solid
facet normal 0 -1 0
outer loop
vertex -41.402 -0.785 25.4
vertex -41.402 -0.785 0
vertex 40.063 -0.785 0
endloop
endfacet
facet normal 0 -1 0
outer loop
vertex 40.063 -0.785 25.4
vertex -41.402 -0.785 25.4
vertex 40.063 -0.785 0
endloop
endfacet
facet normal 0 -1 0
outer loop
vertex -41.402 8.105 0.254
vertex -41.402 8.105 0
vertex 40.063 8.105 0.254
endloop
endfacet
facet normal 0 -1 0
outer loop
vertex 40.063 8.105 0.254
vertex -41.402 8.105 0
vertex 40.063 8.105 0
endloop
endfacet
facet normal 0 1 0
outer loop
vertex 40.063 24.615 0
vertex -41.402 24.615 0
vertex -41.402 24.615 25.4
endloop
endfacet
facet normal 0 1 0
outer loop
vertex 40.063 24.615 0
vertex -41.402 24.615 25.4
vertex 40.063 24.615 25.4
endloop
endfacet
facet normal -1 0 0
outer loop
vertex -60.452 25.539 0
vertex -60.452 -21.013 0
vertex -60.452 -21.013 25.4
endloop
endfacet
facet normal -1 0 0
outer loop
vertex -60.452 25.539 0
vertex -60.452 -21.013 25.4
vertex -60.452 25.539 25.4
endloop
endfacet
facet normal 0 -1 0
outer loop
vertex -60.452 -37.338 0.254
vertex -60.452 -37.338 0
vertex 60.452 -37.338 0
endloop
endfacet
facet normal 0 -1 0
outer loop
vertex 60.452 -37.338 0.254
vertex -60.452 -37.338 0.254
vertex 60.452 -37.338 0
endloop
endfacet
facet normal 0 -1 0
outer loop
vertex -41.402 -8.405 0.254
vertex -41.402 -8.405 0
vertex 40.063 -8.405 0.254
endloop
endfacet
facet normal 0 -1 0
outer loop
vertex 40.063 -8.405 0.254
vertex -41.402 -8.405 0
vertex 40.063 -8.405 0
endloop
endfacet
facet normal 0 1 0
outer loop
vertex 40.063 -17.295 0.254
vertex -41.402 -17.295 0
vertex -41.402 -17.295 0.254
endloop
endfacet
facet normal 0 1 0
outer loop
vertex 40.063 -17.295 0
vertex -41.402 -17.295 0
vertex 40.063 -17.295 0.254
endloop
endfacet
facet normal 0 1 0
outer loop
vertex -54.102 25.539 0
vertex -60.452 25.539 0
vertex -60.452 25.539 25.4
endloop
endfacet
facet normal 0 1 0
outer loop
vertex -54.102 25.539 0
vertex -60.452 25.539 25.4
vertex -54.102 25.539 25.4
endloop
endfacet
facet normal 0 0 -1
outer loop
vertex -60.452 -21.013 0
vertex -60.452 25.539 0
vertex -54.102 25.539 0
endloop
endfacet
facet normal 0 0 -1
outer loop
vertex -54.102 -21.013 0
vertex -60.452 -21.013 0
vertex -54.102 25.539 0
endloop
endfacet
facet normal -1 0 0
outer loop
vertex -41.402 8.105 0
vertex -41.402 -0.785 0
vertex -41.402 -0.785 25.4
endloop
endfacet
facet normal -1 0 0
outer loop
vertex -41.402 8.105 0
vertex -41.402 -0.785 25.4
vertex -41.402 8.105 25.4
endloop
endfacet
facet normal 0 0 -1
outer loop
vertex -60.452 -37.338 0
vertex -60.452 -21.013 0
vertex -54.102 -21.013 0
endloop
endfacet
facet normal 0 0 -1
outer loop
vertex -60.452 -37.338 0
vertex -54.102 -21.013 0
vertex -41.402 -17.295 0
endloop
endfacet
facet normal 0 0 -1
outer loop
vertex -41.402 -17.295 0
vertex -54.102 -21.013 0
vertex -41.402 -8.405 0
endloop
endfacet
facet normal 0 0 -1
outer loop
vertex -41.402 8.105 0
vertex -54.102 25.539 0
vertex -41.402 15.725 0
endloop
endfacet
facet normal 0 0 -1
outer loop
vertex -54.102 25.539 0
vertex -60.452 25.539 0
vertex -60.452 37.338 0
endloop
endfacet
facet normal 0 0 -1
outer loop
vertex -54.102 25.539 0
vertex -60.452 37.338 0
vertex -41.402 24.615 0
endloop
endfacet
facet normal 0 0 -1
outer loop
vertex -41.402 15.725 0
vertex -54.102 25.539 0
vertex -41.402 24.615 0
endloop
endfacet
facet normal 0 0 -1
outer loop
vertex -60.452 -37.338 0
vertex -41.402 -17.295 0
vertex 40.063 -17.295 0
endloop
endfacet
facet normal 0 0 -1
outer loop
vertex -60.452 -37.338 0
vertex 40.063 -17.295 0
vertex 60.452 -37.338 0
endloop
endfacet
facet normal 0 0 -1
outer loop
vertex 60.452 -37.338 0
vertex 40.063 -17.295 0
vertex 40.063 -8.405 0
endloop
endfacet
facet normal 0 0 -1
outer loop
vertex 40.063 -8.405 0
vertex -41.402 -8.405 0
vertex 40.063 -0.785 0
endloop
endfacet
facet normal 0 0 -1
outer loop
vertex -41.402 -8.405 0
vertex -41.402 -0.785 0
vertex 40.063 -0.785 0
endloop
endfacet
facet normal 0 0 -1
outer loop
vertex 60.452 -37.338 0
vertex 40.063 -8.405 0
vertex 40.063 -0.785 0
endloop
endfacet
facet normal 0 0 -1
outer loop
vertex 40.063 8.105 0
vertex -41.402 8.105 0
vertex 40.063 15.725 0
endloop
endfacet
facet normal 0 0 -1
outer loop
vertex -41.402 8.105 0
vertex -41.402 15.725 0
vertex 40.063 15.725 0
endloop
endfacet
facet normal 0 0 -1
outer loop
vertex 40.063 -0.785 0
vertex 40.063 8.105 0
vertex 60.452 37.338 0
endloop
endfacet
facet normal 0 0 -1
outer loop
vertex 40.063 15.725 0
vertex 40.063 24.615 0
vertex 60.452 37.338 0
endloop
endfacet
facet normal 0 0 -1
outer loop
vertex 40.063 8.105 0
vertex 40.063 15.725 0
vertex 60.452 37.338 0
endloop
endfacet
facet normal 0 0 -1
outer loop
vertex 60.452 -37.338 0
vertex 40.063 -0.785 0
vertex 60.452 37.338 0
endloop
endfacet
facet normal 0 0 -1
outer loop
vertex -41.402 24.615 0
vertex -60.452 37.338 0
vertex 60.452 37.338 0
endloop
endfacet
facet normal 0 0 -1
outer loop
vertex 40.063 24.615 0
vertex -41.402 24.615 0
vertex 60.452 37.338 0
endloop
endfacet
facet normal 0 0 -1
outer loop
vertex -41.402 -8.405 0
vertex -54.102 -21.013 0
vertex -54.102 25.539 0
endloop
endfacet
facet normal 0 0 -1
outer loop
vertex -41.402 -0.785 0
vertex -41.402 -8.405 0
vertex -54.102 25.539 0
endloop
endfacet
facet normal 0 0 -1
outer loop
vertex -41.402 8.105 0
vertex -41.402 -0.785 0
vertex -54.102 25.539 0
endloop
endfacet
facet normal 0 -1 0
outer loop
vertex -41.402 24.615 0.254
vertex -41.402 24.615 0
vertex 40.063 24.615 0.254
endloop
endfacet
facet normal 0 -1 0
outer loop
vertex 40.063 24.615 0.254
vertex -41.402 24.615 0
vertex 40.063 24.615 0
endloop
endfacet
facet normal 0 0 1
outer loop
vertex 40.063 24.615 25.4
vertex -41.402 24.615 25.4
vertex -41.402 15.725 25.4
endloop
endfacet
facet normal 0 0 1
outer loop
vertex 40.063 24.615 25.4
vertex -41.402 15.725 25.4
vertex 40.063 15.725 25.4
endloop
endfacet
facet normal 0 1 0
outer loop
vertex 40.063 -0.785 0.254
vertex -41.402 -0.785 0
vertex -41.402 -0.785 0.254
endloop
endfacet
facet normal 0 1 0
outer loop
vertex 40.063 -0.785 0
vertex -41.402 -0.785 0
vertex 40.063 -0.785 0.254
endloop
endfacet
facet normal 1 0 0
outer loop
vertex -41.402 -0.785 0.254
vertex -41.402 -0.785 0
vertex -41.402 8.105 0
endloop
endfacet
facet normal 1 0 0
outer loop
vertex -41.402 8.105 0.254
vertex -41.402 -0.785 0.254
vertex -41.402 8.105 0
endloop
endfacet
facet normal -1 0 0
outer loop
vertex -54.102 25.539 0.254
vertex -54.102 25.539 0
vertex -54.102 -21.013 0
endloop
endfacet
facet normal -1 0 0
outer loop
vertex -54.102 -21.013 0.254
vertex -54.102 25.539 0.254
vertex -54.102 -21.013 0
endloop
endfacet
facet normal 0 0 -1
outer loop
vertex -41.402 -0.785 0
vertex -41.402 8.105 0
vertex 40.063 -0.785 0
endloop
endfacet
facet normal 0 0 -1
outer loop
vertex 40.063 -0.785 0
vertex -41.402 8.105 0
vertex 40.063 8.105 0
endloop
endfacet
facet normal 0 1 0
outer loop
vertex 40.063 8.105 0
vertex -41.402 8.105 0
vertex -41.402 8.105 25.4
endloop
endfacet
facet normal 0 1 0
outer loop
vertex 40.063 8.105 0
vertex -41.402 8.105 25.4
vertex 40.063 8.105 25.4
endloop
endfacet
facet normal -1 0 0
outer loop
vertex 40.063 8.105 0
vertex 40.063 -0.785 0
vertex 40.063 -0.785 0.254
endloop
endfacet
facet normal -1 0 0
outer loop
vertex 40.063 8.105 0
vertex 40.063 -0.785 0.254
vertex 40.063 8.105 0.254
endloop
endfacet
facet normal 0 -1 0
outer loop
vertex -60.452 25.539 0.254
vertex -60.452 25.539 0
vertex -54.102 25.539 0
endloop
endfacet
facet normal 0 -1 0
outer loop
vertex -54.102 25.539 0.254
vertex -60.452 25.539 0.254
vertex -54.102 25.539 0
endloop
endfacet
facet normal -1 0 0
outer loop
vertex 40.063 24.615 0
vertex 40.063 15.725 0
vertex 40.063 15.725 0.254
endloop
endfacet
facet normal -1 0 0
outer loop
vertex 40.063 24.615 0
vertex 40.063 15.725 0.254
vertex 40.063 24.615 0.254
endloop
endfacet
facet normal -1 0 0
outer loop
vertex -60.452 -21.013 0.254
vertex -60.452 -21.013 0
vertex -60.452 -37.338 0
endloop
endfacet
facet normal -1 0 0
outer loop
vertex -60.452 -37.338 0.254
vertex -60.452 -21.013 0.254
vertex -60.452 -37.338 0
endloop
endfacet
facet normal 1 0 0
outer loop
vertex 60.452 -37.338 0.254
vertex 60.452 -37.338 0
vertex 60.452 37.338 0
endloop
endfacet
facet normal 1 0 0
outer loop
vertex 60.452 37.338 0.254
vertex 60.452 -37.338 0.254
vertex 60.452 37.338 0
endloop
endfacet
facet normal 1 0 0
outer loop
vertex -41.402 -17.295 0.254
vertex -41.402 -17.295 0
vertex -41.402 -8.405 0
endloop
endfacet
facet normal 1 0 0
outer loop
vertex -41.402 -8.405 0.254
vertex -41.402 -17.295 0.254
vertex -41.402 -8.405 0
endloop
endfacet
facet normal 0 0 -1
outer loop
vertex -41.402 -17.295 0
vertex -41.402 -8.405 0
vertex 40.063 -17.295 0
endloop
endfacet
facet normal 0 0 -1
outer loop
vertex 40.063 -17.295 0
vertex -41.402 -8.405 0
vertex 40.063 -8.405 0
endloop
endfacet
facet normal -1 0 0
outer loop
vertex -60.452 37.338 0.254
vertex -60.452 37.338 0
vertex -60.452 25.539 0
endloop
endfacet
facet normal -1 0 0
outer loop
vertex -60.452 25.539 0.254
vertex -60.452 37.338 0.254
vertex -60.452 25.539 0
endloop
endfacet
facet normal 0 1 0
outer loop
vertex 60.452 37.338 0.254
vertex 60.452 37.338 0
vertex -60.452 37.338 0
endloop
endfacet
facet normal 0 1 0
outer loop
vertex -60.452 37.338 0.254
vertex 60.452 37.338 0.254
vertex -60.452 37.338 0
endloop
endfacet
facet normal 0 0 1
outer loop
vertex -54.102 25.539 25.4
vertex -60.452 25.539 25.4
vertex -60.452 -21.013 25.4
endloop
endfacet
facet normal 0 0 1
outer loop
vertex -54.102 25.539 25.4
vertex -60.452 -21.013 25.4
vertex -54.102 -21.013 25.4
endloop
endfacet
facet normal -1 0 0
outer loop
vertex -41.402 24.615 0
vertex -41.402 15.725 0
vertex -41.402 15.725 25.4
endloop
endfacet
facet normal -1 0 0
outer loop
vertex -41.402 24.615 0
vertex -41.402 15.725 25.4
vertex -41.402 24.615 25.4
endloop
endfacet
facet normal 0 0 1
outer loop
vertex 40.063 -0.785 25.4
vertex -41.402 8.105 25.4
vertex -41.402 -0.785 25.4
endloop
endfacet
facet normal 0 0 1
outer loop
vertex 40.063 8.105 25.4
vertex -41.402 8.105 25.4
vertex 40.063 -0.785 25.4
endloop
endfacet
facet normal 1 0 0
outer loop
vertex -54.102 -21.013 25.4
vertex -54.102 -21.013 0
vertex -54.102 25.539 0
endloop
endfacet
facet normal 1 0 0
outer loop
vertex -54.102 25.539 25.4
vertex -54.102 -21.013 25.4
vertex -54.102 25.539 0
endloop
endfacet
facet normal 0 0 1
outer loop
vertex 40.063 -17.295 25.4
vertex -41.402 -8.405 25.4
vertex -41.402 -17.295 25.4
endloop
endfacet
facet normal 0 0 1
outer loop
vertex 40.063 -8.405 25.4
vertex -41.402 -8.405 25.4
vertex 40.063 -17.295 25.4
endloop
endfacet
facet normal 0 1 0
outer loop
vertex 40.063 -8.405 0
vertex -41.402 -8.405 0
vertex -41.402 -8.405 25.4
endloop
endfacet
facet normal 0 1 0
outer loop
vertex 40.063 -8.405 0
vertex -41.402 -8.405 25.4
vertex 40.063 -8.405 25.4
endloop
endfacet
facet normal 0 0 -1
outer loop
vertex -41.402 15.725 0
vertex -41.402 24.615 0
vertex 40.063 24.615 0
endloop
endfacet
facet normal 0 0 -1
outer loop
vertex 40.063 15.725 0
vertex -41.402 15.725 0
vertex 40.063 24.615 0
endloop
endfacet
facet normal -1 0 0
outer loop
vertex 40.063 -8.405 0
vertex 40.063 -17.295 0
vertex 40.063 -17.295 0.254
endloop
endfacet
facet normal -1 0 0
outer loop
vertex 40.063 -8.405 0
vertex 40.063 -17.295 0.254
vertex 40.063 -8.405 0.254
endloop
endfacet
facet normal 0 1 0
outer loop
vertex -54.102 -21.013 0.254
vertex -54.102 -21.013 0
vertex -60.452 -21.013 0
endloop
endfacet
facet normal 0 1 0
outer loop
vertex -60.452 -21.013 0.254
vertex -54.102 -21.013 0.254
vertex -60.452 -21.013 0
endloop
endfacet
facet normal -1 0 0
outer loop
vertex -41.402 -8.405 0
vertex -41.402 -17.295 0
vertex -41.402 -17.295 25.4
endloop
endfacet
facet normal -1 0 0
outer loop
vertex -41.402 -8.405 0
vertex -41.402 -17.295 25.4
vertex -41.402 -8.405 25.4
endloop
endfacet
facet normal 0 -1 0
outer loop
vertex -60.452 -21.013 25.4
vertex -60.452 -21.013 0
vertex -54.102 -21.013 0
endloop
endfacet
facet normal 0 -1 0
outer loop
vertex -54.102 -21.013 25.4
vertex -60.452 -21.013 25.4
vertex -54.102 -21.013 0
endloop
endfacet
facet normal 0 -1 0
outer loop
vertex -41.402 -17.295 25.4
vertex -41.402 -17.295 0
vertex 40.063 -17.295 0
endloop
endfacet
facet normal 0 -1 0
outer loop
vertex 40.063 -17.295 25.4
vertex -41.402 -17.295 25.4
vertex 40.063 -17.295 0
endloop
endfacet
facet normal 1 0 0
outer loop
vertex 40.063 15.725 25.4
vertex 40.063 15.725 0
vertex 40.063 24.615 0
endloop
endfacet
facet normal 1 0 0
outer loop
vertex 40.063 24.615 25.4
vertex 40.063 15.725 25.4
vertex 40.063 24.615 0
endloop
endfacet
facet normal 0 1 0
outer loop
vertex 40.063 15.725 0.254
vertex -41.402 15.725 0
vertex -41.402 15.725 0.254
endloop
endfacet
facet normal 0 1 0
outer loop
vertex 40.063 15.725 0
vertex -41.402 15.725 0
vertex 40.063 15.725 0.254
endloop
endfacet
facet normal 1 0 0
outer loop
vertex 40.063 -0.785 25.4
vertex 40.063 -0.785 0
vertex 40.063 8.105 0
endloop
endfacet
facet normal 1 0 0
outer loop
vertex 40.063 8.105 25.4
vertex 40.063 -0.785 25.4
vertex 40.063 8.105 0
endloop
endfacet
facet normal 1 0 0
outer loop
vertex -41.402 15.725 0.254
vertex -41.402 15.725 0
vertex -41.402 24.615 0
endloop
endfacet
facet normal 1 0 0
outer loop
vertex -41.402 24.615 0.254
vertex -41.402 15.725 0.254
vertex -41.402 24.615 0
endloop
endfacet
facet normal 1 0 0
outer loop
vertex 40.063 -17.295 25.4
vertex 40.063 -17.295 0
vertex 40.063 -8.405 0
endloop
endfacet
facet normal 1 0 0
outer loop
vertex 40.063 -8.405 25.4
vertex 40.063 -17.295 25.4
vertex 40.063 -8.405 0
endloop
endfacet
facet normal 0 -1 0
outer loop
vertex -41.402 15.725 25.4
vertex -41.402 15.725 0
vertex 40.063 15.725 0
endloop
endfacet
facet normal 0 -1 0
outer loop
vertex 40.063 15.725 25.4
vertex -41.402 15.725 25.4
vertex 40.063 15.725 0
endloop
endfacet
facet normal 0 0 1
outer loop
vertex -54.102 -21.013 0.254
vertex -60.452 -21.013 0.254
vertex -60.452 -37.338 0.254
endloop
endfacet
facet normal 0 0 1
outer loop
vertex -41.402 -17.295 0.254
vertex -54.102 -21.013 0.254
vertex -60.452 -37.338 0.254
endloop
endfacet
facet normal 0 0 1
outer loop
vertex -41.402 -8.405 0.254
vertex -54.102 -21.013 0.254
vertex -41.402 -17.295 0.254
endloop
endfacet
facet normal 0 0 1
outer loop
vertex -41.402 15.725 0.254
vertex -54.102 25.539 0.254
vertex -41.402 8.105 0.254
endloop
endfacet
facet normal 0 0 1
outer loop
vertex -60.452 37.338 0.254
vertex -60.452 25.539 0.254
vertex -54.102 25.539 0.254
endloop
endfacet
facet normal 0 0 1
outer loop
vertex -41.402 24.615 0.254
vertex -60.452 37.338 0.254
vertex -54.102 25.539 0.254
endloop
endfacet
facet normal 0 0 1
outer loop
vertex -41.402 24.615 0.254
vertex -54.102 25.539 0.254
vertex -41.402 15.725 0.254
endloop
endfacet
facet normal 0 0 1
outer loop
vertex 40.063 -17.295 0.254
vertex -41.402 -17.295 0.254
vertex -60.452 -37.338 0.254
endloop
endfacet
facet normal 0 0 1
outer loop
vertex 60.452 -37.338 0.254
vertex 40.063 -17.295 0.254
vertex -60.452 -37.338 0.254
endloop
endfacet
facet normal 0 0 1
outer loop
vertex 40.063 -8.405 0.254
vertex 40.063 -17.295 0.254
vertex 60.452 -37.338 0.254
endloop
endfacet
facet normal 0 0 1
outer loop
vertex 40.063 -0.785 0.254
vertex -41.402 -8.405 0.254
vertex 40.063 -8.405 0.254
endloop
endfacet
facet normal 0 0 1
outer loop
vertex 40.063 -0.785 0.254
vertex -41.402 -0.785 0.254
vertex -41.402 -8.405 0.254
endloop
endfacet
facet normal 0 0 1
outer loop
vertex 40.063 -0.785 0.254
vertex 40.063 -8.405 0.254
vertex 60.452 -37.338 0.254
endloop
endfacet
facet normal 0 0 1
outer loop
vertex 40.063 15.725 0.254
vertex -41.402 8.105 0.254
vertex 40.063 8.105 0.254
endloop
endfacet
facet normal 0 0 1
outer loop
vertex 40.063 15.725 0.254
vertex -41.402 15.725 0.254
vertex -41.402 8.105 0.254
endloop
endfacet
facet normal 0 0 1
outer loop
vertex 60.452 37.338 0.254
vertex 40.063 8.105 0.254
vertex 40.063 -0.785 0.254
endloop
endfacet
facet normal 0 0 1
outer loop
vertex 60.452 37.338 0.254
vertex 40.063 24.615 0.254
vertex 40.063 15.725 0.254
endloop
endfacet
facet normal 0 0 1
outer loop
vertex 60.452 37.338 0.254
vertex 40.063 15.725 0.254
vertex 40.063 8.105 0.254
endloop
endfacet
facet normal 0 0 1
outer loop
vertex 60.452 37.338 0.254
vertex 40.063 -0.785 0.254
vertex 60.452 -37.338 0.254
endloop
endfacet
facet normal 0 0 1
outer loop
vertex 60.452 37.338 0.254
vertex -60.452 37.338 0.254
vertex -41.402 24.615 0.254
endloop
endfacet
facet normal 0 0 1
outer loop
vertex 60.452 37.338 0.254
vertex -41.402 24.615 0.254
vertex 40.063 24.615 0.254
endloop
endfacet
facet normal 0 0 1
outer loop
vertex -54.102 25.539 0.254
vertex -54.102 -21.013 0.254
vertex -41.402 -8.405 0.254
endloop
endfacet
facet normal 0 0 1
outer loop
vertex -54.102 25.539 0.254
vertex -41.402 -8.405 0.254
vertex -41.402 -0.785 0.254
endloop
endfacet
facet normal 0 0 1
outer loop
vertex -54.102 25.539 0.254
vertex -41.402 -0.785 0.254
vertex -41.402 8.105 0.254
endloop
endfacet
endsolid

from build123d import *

# Parameters (mm, degrees)
F0_W     = 81.464736
F0_H     = 8.89
F0_W_2   = 6.35
F0_H_2   = 46.551276
F1_DEPTH = 25.4
F2_DEPTH = 0.254


with BuildPart() as f1:
    # F0 (on Top) → F1 (new body)
    with BuildSketch(Plane.XY):
        with Locations((-0.66964, 20.169908)):
            Rectangle(F0_W, F0_H)
        with Locations((-57.277008, 2.26291)):
            Rectangle(F0_W_2, F0_H_2)
        with Locations((-0.66964, 3.659908)):
            Rectangle(F0_W, F0_H)
        with Locations((-0.66964, -12.850092)):
            Rectangle(F0_W, F0_H)
    extrude(amount=F1_DEPTH)


with BuildPart() as f2:
    # F0 (on Top) → F2 (new body)
    with BuildSketch(Plane.XY):
        Polygon((60.452008, -37.338001), (60.452008, 37.338001), (-60.452008, 37.338001), (-60.452008, 25.538548), (-54.102008, 25.538548), (-54.102008, -21.012728), (-60.452008, -21.012728), (-60.452008, -37.338001), align=None)
        with Locations((-0.66964, -12.850092)):
            Rectangle(F0_W, F0_H, mode=Mode.SUBTRACT)
        with Locations((-0.66964, 3.659908)):
            Rectangle(F0_W, F0_H, mode=Mode.SUBTRACT)
        with Locations((-0.66964, 20.169908)):
            Rectangle(F0_W, F0_H, mode=Mode.SUBTRACT)
    extrude(amount=F2_DEPTH)


solid = Compound([f1.part, f2.part])
